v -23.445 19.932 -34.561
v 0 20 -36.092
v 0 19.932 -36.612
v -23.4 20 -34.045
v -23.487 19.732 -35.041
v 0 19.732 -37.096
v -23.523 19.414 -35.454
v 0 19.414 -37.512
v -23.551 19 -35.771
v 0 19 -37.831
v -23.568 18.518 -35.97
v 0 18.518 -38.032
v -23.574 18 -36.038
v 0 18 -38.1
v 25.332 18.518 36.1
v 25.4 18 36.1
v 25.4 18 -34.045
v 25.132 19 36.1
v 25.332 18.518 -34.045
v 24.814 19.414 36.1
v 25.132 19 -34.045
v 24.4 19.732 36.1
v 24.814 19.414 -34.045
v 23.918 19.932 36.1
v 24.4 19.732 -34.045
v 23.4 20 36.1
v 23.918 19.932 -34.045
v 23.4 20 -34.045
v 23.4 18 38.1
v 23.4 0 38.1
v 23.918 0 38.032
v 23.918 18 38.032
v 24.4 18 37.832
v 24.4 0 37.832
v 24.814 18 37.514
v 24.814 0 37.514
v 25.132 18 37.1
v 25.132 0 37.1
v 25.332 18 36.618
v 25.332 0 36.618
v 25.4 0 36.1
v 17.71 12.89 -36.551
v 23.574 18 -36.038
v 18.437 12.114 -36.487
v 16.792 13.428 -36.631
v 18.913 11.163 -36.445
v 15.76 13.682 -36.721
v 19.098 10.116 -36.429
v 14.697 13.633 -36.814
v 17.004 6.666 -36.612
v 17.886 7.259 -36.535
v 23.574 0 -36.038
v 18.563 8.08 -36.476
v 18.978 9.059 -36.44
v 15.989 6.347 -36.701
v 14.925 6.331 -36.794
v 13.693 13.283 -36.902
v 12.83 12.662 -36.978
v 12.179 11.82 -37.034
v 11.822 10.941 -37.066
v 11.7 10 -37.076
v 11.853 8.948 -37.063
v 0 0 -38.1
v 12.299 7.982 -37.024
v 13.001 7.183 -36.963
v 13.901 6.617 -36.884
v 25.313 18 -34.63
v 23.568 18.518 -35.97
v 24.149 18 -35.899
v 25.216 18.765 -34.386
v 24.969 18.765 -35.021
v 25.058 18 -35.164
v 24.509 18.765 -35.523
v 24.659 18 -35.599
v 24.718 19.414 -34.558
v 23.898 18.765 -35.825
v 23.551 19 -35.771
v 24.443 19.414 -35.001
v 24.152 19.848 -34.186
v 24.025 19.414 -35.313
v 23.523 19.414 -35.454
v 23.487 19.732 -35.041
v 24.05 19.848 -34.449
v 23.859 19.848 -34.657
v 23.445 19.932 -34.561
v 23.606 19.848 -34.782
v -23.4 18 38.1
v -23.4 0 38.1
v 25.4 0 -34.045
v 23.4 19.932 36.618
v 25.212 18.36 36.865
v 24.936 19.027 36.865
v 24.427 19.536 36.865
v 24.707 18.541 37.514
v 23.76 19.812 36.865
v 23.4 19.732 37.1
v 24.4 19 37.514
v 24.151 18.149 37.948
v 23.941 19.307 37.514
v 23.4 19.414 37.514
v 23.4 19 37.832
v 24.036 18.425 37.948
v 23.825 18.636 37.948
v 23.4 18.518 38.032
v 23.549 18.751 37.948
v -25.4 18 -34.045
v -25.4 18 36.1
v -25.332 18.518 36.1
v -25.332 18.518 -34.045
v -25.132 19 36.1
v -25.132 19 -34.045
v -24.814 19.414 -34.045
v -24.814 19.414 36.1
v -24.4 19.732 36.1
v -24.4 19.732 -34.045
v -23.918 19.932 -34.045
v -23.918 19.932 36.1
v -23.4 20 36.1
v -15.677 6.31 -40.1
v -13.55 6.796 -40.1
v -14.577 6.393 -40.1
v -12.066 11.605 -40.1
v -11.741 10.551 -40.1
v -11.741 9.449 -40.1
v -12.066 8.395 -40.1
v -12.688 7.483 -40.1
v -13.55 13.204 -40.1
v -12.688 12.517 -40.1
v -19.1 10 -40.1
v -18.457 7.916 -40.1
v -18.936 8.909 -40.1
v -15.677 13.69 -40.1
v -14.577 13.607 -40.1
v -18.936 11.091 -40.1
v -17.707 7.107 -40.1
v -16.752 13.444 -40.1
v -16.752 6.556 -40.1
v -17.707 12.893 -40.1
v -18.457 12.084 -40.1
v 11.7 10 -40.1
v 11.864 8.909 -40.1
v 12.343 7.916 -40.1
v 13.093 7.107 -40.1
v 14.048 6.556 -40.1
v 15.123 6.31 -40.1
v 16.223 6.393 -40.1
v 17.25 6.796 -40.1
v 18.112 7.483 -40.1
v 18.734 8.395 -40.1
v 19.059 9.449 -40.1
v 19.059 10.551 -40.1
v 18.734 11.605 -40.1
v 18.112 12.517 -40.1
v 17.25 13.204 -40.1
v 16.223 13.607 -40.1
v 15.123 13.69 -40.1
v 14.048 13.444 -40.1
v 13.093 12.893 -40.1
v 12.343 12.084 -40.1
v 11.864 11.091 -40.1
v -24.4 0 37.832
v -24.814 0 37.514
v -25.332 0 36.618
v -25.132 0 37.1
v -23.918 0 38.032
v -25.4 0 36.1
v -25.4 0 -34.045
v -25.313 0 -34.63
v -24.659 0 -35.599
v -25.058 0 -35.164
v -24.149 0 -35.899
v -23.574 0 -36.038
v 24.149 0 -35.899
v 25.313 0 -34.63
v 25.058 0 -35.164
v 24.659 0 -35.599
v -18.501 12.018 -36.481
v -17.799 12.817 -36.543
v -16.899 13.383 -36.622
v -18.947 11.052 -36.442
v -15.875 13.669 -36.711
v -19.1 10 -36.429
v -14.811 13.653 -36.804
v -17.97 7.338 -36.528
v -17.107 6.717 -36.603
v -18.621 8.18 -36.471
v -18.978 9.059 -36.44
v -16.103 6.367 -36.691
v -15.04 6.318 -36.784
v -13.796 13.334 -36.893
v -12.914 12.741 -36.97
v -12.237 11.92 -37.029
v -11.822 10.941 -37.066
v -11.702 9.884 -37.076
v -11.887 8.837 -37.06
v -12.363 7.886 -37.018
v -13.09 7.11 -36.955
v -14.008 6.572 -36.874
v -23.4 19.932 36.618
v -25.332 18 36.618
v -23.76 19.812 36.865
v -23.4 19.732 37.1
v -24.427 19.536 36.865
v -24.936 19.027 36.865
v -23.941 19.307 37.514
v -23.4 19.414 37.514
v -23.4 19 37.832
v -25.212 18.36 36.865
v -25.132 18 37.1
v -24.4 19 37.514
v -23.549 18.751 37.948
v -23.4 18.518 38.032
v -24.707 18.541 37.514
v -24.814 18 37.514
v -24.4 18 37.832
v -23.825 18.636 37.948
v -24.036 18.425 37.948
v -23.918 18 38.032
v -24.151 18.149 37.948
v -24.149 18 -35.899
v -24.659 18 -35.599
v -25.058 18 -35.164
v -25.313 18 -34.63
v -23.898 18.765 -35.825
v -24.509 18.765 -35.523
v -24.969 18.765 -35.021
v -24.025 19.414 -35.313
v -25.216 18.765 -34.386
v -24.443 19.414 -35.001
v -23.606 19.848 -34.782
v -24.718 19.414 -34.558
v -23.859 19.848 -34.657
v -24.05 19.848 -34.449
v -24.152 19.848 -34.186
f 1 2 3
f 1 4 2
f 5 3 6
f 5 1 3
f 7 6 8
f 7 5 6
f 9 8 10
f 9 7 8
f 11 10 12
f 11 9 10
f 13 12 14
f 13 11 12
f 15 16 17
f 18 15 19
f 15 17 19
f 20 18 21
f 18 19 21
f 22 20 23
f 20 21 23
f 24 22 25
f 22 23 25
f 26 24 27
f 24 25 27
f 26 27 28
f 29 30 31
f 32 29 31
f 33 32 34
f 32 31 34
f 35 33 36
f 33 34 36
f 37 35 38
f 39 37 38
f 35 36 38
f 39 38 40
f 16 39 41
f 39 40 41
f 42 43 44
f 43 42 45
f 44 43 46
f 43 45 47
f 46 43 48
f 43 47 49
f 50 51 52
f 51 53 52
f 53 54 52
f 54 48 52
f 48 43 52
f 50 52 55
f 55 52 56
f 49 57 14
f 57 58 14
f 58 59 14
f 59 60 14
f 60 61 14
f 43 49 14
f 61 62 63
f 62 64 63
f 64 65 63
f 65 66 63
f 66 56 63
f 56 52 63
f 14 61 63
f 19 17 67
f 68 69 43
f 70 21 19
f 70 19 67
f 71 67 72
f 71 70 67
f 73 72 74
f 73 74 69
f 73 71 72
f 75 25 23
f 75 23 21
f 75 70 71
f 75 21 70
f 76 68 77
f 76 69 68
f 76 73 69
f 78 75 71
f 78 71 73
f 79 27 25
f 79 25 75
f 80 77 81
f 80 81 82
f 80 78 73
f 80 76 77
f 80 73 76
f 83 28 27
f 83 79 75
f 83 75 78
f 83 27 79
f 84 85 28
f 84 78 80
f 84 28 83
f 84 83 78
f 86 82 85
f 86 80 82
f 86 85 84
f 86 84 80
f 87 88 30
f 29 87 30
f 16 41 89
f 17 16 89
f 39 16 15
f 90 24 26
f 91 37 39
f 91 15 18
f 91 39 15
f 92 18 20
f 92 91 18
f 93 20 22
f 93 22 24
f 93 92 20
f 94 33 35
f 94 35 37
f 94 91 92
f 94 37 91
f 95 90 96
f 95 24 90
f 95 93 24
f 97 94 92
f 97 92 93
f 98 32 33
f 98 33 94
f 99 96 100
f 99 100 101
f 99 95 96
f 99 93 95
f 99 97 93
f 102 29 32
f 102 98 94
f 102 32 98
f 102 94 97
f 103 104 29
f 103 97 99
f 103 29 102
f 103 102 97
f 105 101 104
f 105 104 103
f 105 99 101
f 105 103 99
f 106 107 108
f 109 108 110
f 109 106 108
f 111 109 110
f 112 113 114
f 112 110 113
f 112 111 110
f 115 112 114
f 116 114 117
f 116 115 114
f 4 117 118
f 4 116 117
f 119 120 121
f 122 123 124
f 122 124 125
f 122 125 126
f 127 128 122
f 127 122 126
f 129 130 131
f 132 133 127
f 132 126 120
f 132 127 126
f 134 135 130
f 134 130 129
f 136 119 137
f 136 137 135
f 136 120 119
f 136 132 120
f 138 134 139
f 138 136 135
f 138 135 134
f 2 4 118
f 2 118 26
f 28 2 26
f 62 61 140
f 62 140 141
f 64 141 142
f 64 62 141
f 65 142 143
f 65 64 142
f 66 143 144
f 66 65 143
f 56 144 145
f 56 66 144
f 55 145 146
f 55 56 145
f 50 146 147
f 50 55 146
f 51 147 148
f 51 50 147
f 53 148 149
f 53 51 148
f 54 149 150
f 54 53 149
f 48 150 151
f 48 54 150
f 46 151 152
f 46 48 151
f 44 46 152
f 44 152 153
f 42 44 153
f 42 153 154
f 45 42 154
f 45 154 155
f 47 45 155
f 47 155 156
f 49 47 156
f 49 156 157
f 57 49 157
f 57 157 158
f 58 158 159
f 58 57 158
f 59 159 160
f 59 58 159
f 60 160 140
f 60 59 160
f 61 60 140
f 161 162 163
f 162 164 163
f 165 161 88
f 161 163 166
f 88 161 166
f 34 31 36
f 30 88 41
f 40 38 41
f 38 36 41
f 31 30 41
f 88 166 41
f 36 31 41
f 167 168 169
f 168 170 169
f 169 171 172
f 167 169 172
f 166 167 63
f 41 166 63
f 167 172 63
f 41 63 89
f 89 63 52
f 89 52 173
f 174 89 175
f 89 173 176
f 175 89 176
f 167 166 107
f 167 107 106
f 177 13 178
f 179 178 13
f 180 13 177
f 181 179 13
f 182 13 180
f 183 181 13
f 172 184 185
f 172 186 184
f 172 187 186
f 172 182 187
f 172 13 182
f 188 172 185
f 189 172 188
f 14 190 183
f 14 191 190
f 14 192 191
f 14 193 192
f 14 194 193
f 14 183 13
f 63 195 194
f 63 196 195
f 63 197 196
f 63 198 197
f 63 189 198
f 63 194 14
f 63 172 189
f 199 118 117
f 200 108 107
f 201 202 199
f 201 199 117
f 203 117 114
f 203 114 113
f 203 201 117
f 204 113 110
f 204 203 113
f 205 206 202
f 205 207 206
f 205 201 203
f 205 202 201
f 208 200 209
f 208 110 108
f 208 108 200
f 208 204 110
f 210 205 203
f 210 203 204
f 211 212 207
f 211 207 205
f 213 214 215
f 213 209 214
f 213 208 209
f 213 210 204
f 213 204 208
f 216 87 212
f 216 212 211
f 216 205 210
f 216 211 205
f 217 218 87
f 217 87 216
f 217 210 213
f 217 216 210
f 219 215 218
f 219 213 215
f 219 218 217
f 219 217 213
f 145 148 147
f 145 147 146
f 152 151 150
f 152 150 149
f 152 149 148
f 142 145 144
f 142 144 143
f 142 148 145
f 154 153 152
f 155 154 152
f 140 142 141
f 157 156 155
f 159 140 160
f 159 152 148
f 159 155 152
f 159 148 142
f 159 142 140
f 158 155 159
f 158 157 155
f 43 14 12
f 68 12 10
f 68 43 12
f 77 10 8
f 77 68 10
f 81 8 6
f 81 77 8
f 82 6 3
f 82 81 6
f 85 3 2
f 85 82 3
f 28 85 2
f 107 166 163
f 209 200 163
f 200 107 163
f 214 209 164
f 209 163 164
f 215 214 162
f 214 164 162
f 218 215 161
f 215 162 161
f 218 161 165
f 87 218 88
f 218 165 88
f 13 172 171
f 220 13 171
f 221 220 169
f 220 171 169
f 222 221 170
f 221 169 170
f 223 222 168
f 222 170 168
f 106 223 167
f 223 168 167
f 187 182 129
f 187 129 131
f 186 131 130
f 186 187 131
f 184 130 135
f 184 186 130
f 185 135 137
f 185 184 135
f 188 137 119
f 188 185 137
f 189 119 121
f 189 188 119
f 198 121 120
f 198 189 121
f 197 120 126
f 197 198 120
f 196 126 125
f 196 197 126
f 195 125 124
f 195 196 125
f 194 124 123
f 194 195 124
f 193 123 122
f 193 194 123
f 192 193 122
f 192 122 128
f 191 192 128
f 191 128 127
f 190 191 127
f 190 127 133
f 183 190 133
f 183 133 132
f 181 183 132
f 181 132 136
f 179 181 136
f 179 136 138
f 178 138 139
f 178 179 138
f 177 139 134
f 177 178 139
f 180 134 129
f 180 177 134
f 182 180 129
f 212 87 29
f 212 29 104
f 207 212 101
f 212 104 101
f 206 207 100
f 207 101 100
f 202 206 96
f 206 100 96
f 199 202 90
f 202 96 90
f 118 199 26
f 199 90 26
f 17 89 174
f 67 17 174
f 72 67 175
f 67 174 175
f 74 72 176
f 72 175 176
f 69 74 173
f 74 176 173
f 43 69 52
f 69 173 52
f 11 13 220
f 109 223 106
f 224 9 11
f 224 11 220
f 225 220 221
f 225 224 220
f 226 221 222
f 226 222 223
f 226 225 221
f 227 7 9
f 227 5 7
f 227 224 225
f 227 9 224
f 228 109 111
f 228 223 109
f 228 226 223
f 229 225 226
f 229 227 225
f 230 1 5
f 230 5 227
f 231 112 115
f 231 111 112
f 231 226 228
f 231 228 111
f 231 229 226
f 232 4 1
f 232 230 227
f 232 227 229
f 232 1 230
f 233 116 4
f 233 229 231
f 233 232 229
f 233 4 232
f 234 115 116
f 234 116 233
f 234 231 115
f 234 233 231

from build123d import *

# Parameters (mm, degrees)
SKETCH1_W           = 50.8
SKETCH1_H           = 76.2
BOSS_EXTRUDE2_DEPTH = 20
SKETCH2_R           = 3.7
BOSS_EXTRUDE3_DEPTH = 2
CHAMFER7_SIZE       = 2.222212054
CHAMFER7_SIZE_2     = 25.4
FILLET6_R           = 2
FILLET7_R           = 2
FILLET8_R           = 2
FILLET9_R           = 2
FILLET10_R          = 2


with BuildPart() as part:
    # Sketch1 → Boss-Extrude2 (new body)
    with BuildSketch(Plane(origin=(0, 0, 0), x_dir=(1, 0, 0), z_dir=(0, 1, 0))):
        Rectangle(SKETCH1_W, SKETCH1_H)
    extrude(amount=BOSS_EXTRUDE2_DEPTH)

    # Sketch2 → Boss-Extrude3 (add)
    with BuildSketch(Plane(origin=(0, 0, -38.1), x_dir=(-1, 0, 0), z_dir=(0, 0, -1))):
        with Locations((-15.4, 10)):
            Circle(SKETCH2_R)
        with Locations((15.4, 10)):
            Circle(SKETCH2_R)
    extrude(amount=BOSS_EXTRUDE3_DEPTH)

    # Chamfer7
    # the kernel refuses this chamfer: 25.4, 2.222212054 mm, written as the material it takes off along each edge
    with BuildSketch(Plane(origin=(-25.4, -66.030705628, -38.1), x_dir=(-0.40120984275090654, 0, 0.9159861691531116), z_dir=(0, 1, 0))) as chamfer7_piece_1_section:
        Polygon((CHAMFER7_SIZE * 0.915986168971, CHAMFER7_SIZE * 0.401209842671), (-CHAMFER7_SIZE_2 * 0.401209842751, CHAMFER7_SIZE_2 * 0.915986169153), (0, 0), align=None)
    chamfer7_piece_1 = extrude(amount=152.061411256, mode=Mode.PRIVATE)
    chamfer7_piece_1 = chamfer7_piece_1 - Plane(origin=(-15.4, 10, -36.375506271), x_dir=(-1, 0, 0), z_dir=(0, 0, 1)) * Cylinder(3.7, 398, mode=Mode.PRIVATE)
    add(chamfer7_piece_1, mode=Mode.SUBTRACT)
    with BuildSketch(Plane(origin=(25.4, -66.030705628, -38.1), x_dir=(0.4012098427509076, 0, 0.9159861691531113), z_dir=(0, 1, 0))) as chamfer7_piece_2_section:
        Polygon((CHAMFER7_SIZE * 0.915986168971, -CHAMFER7_SIZE * 0.401209842671), (-CHAMFER7_SIZE_2 * 0.401209842751, -CHAMFER7_SIZE_2 * 0.915986169153), (0, 0), align=None)
    chamfer7_piece_2 = extrude(amount=152.061411256, mode=Mode.PRIVATE)
    chamfer7_piece_2 = chamfer7_piece_2 - Plane(origin=(15.4, 10, -36.375506337), x_dir=(-1, 0, 0), z_dir=(0, 0, 1)) * Cylinder(3.7, 398, mode=Mode.PRIVATE)
    add(chamfer7_piece_2, mode=Mode.SUBTRACT)

    # Fillet6
    fillet6_edges = [part.edges().sort_by_distance(p)[0] for p in [
        (25.4, 20, 1.111106027),
        (0, 20, 38.1),
        (12.7, 20, -36.988893973),
        (-12.7, 20, -36.988893973),
        (-25.4, 20, 1.111106027),
    ]]
    fillet(fillet6_edges, radius=FILLET6_R)

    # Fillet7
    # the kernel refuses this fillet: 2 mm, written as the material it takes off along each edge
    with BuildSketch(Plane(origin=(23.4, 18, -34.045125598), x_dir=(1, 0, 0), z_dir=(0, 1, 0))) as fillet7_piece_1_section:
        Polygon((0, 0), (FILLET7_R, 0), (FILLET7_R, FILLET7_R * 0.916331174017), (FILLET7_R * 0.0871557427476, FILLET7_R * 0.996194698092), align=None)
    fillet7_piece_1 = extrude(amount=FILLET7_R, mode=Mode.PRIVATE)
    fillet7_piece_1 = fillet7_piece_1 - Plane(origin=(23.4, 18, -34.045125598), x_dir=(-0.73727733681012, 0, 0.6755902076156647), z_dir=(0, 1, 0)) * Sphere(FILLET7_R, mode=Mode.PRIVATE)
    add(fillet7_piece_1, mode=Mode.SUBTRACT)
    with BuildSketch(Plane(origin=(25.4, -4.58165587, -35.877787946), x_dir=(0, 0, 1), z_dir=(0, 1, 0))) as fillet7_piece_2:
        with BuildLine():
            CenterArc((FILLET7_R * 0.916331174017, -FILLET7_R), FILLET7_R, 90, 85)
            Line((-FILLET7_R * 0.0798635240743, -FILLET7_R * 0.912844257252), (0, 0))
            Line((0, 0), (FILLET7_R * 0.916331174017, 0))
        make_face()
    extrude(amount=22.58165587, mode=Mode.SUBTRACT)

    # Fillet8
    # the kernel refuses this fillet: 2 mm, written as the material it takes off along each edge
    with BuildSketch(Plane(origin=(23.4, 18, 36.1), x_dir=(1, 0, 0), z_dir=(0, 0, 1))) as fillet8_piece_1_section:
        Polygon((0, 0), (FILLET8_R, 0), (FILLET8_R, FILLET8_R), (0, FILLET8_R), align=None)
    fillet8_piece_1 = extrude(amount=FILLET8_R, mode=Mode.PRIVATE)
    fillet8_piece_1 = fillet8_piece_1 - Plane(origin=(23.4, 18, 36.1), x_dir=(-0.7071067811865475, -0.7071067811865475, 0), z_dir=(0, 0, 1)) * Sphere(FILLET8_R, mode=Mode.PRIVATE)
    add(fillet8_piece_1, mode=Mode.SUBTRACT)
    with BuildSketch(Plane(origin=(25.4, -5, 38.1), x_dir=(-1, 0, 0), z_dir=(0, 1, 0))) as fillet8_piece_2:
        with BuildLine():
            CenterArc((FILLET8_R, -FILLET8_R), FILLET8_R, 90, 90)
            Line((0, -FILLET8_R), (0, 0))
            Line((0, 0), (FILLET8_R, 0))
        make_face()
    extrude(amount=23, mode=Mode.SUBTRACT)

    # Fillet9
    # the kernel refuses this fillet: 2 mm, written as the material it takes off along each edge
    with BuildSketch(Plane(origin=(-23.4, 18, 36.1), x_dir=(-1, 0, 0), z_dir=(0, 0, 1))) as fillet9_piece_1_section:
        Polygon((0, 0), (FILLET9_R, 0), (FILLET9_R, -FILLET9_R), (0, -FILLET9_R), align=None)
    fillet9_piece_1 = extrude(amount=FILLET9_R, mode=Mode.PRIVATE)
    fillet9_piece_1 = fillet9_piece_1 - Plane(origin=(-23.4, 18, 36.1), x_dir=(0.7071067811865475, -0.7071067811865475, 0), z_dir=(0, 0, 1)) * Sphere(FILLET9_R, mode=Mode.PRIVATE)
    add(fillet9_piece_1, mode=Mode.SUBTRACT)
    with BuildSketch(Plane(origin=(-25.4, -5, 38.1), x_dir=(1, 0, 0), z_dir=(0, 1, 0))) as fillet9_piece_2:
        with BuildLine():
            CenterArc((FILLET9_R, FILLET9_R), FILLET9_R, 180, 90)
            Line((0, FILLET9_R), (0, 0))
            Line((0, 0), (FILLET9_R, 0))
        make_face()
    extrude(amount=23, mode=Mode.SUBTRACT)

    # Fillet10
    # the kernel refuses this fillet: 2 mm, written as the material it takes off along each edge
    with BuildSketch(Plane(origin=(-23.4, 18, -34.045125598), x_dir=(-1, 0, 0), z_dir=(0, 1, 0))) as fillet10_piece_1_section:
        Polygon((0, 0), (FILLET10_R, 0), (FILLET10_R, -FILLET10_R * 0.916331174017), (FILLET10_R * 0.0871557427476, -FILLET10_R * 0.996194698092), align=None)
    fillet10_piece_1 = extrude(amount=FILLET10_R, mode=Mode.PRIVATE)
    fillet10_piece_1 = fillet10_piece_1 - Plane(origin=(-23.4, 18, -34.045125598), x_dir=(0.73727733681012, 0, 0.6755902076156647), z_dir=(0, 1, 0)) * Sphere(FILLET10_R, mode=Mode.PRIVATE)
    add(fillet10_piece_1, mode=Mode.SUBTRACT)
    with BuildSketch(Plane(origin=(-25.4, -4.58165587, -35.877787946), x_dir=(0, 0, 1), z_dir=(0, 1, 0))) as fillet10_piece_2:
        with BuildLine():
            CenterArc((FILLET10_R * 0.916331174017, FILLET10_R), FILLET10_R, 185, 85)
            Line((-FILLET10_R * 0.0798635240743, FILLET10_R * 0.912844257252), (0, 0))
            Line((0, 0), (FILLET10_R * 0.916331174017, 0))
        make_face()
    extrude(amount=22.58165587, mode=Mode.SUBTRACT)


solid = part.part
